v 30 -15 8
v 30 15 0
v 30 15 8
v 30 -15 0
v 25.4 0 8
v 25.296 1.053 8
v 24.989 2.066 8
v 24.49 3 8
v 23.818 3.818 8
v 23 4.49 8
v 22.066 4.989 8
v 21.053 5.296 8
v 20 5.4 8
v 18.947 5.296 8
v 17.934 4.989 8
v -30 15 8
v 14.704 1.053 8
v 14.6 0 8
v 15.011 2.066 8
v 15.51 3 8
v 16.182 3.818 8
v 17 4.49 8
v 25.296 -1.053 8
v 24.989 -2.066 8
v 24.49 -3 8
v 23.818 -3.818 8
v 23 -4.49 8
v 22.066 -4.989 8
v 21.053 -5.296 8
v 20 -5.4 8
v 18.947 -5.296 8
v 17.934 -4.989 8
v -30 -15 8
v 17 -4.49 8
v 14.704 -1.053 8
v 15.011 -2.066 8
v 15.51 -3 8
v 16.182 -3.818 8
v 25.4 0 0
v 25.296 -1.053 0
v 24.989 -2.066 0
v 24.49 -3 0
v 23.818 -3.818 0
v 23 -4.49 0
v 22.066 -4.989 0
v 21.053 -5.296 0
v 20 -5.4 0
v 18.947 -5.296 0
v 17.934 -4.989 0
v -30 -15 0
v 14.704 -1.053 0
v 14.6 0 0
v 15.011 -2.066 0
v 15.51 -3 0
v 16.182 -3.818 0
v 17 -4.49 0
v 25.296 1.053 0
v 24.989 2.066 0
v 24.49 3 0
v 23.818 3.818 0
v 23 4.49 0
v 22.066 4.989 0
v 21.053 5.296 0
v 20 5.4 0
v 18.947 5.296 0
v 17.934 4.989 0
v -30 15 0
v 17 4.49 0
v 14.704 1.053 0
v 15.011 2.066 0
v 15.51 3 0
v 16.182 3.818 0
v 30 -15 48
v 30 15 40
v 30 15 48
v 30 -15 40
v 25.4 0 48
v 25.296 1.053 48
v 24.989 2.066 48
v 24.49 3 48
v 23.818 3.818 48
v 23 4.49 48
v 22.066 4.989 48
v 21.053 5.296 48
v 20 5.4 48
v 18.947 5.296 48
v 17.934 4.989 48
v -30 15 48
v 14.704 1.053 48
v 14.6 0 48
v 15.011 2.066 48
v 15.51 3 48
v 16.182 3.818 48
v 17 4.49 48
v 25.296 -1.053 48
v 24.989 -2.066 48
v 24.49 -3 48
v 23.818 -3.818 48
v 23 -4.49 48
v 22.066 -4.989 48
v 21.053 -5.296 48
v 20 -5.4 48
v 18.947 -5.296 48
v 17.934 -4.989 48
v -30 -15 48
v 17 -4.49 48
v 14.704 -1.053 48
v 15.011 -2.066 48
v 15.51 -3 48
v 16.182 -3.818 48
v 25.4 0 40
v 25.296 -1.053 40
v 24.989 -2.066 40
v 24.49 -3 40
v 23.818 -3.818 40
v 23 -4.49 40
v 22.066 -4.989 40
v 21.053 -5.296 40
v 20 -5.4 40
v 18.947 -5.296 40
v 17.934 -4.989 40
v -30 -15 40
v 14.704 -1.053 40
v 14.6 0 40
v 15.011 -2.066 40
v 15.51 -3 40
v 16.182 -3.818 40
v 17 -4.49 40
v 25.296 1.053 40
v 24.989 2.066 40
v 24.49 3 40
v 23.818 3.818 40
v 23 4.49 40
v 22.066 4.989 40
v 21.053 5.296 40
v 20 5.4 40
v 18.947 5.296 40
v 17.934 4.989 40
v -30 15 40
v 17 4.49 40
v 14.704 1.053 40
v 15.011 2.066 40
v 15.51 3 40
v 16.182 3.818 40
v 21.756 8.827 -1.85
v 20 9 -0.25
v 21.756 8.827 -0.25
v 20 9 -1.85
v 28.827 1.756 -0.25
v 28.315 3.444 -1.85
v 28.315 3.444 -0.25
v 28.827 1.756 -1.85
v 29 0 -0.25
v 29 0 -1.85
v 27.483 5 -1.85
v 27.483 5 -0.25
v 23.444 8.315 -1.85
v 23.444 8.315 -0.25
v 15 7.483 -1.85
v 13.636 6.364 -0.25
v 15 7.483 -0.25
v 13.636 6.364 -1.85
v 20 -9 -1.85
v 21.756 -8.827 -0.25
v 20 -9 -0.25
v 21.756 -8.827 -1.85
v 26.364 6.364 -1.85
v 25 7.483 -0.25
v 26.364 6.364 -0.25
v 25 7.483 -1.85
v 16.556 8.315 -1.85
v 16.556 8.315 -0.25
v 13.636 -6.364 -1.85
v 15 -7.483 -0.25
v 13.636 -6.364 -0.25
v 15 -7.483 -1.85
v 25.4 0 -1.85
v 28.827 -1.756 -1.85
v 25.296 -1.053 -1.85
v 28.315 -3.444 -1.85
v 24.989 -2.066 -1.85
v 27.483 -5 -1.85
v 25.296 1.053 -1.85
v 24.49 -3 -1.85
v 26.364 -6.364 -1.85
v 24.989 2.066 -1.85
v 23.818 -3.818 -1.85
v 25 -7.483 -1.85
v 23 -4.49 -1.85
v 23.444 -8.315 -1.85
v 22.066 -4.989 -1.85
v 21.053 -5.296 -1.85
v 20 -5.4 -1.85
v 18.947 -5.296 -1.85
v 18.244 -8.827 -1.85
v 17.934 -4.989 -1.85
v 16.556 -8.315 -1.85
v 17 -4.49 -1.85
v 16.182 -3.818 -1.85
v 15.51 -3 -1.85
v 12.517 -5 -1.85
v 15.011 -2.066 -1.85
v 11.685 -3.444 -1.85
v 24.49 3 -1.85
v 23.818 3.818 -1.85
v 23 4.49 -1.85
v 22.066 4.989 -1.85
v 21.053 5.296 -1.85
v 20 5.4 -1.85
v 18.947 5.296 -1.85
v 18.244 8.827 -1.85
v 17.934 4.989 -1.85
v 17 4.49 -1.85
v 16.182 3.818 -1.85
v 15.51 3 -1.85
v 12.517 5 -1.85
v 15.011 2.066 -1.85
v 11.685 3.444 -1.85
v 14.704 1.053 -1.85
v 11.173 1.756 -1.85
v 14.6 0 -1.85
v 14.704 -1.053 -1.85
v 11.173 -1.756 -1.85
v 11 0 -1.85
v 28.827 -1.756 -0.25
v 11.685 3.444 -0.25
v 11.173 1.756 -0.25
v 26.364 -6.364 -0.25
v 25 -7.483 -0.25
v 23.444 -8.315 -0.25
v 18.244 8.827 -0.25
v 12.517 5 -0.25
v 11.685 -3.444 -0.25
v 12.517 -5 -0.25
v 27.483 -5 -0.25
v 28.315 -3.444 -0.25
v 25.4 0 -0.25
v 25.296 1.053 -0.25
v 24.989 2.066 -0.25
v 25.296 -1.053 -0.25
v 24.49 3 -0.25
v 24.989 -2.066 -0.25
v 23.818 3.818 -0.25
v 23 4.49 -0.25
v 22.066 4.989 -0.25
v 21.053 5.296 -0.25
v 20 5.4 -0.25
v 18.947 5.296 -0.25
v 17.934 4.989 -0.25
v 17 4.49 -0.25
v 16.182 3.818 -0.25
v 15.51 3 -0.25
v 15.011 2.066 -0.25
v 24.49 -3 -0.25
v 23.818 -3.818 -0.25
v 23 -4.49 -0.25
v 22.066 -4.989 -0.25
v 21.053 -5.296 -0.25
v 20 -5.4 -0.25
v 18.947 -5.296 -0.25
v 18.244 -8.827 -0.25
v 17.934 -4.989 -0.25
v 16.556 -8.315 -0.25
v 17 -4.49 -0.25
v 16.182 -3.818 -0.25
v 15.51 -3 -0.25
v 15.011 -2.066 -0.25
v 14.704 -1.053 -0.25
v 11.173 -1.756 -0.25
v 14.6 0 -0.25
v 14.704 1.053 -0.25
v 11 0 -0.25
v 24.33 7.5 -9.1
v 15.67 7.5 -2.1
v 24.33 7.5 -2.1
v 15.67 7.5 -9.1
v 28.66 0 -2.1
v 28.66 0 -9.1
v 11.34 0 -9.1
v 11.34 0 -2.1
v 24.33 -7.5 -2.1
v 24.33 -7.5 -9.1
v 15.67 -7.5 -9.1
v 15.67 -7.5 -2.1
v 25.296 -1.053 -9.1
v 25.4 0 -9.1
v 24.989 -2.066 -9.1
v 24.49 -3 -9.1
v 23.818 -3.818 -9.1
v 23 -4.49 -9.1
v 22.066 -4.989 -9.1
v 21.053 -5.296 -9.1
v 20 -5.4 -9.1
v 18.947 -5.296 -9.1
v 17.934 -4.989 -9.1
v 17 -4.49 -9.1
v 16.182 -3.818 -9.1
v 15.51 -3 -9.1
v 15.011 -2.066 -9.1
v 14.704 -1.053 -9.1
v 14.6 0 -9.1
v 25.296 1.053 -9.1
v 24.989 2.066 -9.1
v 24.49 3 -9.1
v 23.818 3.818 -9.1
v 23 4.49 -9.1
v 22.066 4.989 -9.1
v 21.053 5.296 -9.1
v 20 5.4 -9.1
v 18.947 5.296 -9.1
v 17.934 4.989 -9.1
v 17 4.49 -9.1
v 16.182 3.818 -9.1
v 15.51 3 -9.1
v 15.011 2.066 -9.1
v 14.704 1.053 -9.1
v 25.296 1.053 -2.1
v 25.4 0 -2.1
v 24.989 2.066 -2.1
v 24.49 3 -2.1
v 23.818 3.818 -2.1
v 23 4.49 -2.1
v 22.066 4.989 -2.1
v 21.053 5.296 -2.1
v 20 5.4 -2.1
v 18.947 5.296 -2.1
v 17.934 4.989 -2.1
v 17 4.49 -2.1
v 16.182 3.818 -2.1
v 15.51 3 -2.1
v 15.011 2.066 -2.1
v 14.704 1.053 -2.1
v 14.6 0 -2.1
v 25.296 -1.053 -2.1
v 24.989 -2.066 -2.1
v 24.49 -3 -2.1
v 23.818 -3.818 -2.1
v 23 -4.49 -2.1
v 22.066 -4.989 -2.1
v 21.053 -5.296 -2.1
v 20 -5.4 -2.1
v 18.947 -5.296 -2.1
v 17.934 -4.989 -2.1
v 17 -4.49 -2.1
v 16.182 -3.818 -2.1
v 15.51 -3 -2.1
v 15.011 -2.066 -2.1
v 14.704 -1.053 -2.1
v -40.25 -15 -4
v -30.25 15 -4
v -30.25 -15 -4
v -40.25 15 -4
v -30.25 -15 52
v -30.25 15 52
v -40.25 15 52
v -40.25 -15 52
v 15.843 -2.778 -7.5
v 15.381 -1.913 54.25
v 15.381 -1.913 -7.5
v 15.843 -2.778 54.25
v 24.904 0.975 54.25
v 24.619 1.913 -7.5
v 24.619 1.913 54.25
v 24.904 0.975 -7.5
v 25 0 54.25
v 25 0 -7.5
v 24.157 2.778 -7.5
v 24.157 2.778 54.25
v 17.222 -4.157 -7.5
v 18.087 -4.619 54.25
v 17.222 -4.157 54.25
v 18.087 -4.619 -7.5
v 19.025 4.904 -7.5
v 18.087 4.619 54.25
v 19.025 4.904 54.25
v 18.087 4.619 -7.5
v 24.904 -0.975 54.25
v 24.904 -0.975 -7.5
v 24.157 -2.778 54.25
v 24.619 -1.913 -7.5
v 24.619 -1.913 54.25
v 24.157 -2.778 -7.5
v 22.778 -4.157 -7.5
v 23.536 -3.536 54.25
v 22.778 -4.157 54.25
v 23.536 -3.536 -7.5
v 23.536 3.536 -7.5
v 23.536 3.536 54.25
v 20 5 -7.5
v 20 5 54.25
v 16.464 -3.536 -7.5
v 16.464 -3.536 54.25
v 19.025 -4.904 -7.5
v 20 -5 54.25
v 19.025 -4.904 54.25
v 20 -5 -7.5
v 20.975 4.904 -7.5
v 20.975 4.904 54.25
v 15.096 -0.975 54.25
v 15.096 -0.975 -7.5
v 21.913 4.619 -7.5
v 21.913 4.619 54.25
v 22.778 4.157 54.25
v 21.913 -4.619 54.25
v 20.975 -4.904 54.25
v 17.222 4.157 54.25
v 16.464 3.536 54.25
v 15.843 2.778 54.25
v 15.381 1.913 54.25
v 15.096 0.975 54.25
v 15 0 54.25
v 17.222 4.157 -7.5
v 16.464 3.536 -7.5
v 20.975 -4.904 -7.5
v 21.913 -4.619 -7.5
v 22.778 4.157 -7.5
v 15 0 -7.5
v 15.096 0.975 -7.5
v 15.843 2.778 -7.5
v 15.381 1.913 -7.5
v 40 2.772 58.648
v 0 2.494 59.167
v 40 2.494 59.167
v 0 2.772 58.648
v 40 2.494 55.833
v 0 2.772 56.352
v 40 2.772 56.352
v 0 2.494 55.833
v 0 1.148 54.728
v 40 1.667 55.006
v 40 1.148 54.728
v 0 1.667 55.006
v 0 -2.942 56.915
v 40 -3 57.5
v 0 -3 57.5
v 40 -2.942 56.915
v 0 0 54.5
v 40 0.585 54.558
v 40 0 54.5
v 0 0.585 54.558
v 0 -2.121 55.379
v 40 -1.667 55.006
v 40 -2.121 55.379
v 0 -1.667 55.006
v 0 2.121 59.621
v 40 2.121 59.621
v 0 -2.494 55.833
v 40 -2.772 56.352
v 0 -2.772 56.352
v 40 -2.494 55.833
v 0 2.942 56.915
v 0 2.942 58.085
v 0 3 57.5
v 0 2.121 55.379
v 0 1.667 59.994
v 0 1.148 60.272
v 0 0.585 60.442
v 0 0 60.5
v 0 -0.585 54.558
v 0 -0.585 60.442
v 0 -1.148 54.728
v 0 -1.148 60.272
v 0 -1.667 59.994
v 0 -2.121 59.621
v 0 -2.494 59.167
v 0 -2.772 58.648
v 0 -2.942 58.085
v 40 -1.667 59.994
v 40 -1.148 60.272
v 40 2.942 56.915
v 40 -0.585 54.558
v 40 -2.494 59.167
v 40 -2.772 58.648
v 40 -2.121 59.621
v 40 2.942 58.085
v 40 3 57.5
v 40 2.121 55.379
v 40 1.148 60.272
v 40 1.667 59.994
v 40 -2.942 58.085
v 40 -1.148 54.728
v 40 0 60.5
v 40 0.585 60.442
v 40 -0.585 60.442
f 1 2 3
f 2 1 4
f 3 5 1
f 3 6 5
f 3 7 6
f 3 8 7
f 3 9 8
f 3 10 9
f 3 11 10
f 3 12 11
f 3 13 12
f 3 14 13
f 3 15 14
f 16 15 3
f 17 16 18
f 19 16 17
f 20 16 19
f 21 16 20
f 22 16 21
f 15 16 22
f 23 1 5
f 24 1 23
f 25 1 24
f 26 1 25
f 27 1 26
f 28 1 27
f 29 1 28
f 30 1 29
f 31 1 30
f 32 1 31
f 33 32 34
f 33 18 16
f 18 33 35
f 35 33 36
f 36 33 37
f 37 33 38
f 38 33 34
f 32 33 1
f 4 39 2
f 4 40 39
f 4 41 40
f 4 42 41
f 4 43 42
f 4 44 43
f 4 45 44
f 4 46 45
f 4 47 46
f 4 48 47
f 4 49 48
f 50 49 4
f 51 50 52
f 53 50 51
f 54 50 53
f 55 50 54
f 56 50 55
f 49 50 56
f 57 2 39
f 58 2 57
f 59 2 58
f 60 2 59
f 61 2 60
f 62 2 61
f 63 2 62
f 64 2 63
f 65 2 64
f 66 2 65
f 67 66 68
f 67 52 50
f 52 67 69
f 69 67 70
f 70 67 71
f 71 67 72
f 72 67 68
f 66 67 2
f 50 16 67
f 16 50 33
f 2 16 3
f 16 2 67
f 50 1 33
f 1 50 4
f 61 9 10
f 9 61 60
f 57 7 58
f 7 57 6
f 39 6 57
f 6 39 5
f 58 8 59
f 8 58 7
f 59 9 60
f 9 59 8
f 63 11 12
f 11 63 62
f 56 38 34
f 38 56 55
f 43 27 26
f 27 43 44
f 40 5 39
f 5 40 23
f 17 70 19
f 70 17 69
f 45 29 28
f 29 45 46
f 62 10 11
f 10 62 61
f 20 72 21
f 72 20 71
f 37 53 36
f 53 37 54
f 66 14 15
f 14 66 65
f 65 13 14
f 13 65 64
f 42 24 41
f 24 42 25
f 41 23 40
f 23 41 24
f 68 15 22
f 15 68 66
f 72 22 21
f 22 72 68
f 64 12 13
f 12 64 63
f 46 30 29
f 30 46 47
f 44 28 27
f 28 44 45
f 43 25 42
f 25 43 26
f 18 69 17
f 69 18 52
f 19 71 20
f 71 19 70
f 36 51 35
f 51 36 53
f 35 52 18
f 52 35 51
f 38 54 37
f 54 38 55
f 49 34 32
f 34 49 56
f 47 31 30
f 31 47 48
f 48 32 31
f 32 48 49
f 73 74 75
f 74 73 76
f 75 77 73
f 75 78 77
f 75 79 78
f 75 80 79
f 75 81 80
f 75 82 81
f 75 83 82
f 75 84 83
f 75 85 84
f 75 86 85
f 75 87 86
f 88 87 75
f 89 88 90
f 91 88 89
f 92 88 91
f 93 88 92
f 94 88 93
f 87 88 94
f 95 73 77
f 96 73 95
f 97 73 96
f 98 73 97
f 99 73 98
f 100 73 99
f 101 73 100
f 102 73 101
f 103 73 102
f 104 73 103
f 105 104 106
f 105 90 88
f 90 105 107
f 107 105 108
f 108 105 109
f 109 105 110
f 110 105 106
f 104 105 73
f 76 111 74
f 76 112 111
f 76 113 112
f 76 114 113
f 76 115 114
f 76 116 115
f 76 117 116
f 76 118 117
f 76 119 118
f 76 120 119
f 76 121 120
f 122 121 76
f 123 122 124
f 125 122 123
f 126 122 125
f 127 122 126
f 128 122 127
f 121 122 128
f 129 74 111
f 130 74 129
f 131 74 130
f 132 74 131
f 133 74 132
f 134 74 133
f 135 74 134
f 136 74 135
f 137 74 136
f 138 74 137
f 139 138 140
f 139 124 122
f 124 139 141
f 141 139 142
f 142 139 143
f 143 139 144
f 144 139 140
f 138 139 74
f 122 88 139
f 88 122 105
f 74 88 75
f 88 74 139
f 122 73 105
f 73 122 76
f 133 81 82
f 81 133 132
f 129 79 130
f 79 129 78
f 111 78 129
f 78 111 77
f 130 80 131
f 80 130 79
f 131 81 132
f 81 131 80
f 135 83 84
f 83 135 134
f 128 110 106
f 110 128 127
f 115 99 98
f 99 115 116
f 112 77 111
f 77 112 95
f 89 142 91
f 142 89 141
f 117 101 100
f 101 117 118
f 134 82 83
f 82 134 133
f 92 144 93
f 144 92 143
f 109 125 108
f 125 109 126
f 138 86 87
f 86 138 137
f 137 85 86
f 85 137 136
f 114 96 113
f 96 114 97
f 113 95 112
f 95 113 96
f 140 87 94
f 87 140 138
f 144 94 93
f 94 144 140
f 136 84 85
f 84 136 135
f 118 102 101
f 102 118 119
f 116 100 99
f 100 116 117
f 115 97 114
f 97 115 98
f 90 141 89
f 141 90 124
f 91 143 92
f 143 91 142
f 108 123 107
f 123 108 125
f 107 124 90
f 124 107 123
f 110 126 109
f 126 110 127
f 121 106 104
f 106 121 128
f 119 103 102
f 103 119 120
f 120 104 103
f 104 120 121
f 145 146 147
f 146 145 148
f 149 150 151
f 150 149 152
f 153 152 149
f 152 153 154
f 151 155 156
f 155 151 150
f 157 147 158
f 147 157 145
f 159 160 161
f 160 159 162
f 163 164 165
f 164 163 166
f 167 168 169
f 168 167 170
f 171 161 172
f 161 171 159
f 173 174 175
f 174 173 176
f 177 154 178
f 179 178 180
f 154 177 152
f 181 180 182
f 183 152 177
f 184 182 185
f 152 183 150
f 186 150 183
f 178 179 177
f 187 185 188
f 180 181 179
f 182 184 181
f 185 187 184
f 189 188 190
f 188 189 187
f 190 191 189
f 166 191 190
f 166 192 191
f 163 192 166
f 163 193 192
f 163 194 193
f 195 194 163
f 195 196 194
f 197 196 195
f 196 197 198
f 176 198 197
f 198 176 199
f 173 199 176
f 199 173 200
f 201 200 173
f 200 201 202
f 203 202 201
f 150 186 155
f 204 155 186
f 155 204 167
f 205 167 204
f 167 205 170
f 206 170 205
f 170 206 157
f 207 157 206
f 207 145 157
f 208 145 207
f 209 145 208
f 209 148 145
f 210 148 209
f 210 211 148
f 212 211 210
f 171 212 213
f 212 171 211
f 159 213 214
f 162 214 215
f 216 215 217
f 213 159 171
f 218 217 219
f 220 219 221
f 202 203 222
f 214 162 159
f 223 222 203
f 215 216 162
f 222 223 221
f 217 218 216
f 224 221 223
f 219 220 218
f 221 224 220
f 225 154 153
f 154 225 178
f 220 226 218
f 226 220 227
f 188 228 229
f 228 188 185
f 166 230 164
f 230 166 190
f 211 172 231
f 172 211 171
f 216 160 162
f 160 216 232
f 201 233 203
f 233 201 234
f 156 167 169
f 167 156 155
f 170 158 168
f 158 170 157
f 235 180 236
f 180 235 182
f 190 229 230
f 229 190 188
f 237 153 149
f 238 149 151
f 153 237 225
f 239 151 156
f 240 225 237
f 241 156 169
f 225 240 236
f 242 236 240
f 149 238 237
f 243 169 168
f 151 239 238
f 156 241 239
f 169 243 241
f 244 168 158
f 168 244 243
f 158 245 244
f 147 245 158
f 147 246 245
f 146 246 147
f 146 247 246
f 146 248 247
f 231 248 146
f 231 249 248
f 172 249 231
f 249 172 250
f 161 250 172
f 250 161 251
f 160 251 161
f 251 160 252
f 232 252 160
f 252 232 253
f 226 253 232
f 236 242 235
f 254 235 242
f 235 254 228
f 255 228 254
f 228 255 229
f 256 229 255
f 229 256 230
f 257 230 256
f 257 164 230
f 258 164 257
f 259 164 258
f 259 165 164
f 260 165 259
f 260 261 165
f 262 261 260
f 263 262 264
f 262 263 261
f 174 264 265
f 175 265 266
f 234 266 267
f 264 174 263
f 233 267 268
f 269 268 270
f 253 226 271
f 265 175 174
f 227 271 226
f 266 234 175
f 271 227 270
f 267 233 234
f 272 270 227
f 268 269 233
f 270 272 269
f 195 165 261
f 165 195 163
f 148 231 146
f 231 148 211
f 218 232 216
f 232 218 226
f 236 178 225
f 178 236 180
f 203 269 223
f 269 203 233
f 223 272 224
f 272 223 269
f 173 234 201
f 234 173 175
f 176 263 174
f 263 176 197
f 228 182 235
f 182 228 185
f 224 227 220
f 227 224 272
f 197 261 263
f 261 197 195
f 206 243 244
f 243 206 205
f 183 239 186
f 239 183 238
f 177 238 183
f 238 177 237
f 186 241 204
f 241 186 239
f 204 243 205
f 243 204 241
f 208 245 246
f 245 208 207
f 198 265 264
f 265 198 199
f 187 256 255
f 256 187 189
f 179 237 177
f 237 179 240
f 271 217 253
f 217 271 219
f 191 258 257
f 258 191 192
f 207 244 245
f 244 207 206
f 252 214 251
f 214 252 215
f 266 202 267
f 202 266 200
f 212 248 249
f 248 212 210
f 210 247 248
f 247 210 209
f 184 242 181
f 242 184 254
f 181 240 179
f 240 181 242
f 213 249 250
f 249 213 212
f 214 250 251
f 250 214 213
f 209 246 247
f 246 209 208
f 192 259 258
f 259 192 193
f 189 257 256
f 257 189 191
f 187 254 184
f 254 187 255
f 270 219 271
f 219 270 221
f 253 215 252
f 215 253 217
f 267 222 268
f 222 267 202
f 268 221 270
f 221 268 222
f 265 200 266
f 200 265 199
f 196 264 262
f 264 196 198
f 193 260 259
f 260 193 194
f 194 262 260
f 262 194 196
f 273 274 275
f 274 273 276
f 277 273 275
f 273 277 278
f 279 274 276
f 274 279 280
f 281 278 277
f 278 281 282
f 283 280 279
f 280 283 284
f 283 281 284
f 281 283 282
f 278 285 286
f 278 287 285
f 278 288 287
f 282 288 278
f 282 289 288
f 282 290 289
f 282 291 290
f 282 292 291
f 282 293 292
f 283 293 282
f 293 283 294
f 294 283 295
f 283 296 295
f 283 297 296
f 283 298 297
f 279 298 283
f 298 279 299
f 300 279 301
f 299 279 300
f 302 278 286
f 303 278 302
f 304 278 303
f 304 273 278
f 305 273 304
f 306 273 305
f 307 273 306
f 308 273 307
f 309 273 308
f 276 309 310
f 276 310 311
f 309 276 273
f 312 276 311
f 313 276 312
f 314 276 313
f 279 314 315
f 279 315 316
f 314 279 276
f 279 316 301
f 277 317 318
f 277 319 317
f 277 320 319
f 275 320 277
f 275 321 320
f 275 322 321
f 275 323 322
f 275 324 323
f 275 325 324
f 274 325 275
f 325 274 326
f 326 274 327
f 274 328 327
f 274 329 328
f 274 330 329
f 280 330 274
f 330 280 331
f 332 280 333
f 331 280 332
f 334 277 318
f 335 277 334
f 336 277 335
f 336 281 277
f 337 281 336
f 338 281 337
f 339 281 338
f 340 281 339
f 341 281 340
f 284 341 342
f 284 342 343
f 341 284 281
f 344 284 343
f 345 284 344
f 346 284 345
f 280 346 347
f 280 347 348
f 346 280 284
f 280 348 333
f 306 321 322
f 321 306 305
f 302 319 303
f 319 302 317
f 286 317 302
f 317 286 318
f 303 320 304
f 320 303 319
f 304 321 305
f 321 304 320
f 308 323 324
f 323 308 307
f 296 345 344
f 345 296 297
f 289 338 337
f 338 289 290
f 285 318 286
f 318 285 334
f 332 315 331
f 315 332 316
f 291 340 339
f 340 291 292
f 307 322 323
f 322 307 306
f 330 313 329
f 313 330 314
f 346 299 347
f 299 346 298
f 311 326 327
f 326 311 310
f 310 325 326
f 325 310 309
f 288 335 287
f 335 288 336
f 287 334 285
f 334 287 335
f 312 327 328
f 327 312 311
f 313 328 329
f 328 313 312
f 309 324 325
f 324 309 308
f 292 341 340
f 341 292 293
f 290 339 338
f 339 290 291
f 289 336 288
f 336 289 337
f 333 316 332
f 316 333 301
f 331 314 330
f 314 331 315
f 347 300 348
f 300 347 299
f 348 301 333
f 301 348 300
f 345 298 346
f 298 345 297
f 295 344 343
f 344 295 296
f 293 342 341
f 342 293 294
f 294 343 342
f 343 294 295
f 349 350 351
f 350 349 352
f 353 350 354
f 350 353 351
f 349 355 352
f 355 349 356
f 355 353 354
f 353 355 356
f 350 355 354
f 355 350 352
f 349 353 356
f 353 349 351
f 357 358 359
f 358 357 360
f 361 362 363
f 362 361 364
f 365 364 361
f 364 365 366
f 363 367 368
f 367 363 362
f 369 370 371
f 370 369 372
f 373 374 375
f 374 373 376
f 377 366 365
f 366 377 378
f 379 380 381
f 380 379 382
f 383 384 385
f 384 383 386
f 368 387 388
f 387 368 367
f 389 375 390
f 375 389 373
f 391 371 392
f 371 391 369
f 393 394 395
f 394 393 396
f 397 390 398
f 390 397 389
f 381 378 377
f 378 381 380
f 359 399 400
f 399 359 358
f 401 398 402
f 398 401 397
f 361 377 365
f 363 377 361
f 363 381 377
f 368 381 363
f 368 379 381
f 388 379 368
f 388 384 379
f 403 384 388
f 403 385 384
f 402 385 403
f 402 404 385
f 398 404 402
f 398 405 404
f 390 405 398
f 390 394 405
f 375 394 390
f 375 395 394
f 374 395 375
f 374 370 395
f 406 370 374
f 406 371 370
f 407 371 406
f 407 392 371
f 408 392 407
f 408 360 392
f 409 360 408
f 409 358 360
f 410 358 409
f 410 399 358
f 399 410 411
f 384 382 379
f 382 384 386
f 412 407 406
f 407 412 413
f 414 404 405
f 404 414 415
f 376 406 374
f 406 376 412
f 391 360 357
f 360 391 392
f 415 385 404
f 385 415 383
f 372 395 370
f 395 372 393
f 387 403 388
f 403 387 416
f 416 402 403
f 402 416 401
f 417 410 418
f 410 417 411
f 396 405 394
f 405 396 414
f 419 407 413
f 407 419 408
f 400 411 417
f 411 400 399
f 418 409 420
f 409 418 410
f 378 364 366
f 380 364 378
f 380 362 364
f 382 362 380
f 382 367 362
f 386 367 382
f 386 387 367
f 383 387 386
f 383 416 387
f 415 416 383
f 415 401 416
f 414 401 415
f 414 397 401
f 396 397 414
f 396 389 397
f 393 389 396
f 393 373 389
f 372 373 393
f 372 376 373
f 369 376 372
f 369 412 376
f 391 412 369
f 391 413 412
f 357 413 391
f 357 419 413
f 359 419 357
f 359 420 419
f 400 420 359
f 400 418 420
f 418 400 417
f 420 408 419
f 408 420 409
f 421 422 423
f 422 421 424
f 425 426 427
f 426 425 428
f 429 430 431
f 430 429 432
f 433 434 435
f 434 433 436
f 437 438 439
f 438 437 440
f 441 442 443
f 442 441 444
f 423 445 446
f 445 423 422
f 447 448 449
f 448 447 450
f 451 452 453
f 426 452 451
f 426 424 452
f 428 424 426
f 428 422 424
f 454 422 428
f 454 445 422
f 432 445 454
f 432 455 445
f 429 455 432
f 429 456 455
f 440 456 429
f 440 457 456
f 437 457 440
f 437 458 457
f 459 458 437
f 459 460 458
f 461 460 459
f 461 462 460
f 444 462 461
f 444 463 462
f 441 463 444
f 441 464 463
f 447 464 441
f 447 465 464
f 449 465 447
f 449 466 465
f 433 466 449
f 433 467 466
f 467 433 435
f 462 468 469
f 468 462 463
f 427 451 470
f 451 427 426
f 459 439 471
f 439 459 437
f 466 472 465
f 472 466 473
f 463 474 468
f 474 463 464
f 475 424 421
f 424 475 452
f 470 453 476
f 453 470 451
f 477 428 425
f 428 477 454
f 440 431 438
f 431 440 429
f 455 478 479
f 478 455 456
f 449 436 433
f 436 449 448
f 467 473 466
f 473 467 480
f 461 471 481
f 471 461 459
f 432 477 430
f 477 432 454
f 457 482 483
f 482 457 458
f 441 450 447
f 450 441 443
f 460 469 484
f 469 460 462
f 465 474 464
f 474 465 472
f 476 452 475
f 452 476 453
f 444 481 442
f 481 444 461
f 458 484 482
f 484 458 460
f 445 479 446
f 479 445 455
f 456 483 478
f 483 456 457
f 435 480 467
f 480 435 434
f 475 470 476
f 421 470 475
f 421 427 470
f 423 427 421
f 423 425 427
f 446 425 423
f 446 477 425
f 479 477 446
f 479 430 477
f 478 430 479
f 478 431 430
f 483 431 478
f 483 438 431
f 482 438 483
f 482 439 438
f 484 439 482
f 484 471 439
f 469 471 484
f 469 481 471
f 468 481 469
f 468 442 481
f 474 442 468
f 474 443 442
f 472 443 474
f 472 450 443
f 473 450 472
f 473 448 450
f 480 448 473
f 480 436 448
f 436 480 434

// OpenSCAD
$fn = 32;

// ------------------------------------------------------------------------
// C clamp: throat 40 mm, screw d10
// Every part is its own module, assembly() places every instance.
// ------------------------------------------------------------------------

// --- part 1 ---
module clamp_arm() {
  difference() {
    translate([-30, -15, 0]) cube([60, 30, 8]);
    translate([20, 0, -1]) cylinder(h = 10, d = 10.8);
  }
}

// --- part 2 ---
module clamp_spine() {
  difference() {
    translate([-28, -15, 0]) cube([56, 30, 10]);
  }
}

// --- part 3 ---
module clamp_screw() {
  translate([0, 0, -30.875]) cylinder(h = 61.75, d = 10);
}

// --- part 4 ---
module clamp_washer() {
  difference() {
      translate([0, 0, 0]) cylinder(h = 1.6, d = 18);
      translate([0, 0, -1]) cylinder(h = 3.6, d = 10.8);
    }
}

// --- part 5 ---
module clamp_nut() {
  difference() {
    linear_extrude(height = 7) polygon(points = [[8.66, 0], [4.33, 7.5], [-4.33, 7.5], [-8.66, 0], [-4.33, -7.5], [4.33, -7.5]]);
    translate([0, 0, -1]) cylinder(h = 9, d = 10.8);
  }
}

// --- part 6 ---
module tommy_bar() {
  translate([0, 0, -20]) cylinder(h = 40, d = 6);
}

// --- assembly ---
module assembly() {
  color([0.80, 0.24, 0.20]) translate([0, 0, 0]) rotate([0, 0, 0]) clamp_arm();
  color([0.20, 0.45, 0.75]) translate([0, 0, 40]) rotate([0, 0, 0]) clamp_arm();
  color([0.25, 0.62, 0.32]) translate([-40.25, 0, 24]) rotate([0, 90, 0]) clamp_spine();
  color([0.92, 0.70, 0.18]) translate([20, 0, 23.375]) rotate([0, 0, 0]) clamp_screw();
  color([0.58, 0.35, 0.70]) translate([20, 0, -1.85]) rotate([0, 0, 0]) clamp_washer();
  color([0.16, 0.66, 0.66]) translate([20, 0, -9.1]) rotate([0, 0, 0]) clamp_nut();
  color([0.85, 0.48, 0.18]) translate([20, 0, 57.5]) rotate([0, 90, 0]) tommy_bar();
}

assembly();
